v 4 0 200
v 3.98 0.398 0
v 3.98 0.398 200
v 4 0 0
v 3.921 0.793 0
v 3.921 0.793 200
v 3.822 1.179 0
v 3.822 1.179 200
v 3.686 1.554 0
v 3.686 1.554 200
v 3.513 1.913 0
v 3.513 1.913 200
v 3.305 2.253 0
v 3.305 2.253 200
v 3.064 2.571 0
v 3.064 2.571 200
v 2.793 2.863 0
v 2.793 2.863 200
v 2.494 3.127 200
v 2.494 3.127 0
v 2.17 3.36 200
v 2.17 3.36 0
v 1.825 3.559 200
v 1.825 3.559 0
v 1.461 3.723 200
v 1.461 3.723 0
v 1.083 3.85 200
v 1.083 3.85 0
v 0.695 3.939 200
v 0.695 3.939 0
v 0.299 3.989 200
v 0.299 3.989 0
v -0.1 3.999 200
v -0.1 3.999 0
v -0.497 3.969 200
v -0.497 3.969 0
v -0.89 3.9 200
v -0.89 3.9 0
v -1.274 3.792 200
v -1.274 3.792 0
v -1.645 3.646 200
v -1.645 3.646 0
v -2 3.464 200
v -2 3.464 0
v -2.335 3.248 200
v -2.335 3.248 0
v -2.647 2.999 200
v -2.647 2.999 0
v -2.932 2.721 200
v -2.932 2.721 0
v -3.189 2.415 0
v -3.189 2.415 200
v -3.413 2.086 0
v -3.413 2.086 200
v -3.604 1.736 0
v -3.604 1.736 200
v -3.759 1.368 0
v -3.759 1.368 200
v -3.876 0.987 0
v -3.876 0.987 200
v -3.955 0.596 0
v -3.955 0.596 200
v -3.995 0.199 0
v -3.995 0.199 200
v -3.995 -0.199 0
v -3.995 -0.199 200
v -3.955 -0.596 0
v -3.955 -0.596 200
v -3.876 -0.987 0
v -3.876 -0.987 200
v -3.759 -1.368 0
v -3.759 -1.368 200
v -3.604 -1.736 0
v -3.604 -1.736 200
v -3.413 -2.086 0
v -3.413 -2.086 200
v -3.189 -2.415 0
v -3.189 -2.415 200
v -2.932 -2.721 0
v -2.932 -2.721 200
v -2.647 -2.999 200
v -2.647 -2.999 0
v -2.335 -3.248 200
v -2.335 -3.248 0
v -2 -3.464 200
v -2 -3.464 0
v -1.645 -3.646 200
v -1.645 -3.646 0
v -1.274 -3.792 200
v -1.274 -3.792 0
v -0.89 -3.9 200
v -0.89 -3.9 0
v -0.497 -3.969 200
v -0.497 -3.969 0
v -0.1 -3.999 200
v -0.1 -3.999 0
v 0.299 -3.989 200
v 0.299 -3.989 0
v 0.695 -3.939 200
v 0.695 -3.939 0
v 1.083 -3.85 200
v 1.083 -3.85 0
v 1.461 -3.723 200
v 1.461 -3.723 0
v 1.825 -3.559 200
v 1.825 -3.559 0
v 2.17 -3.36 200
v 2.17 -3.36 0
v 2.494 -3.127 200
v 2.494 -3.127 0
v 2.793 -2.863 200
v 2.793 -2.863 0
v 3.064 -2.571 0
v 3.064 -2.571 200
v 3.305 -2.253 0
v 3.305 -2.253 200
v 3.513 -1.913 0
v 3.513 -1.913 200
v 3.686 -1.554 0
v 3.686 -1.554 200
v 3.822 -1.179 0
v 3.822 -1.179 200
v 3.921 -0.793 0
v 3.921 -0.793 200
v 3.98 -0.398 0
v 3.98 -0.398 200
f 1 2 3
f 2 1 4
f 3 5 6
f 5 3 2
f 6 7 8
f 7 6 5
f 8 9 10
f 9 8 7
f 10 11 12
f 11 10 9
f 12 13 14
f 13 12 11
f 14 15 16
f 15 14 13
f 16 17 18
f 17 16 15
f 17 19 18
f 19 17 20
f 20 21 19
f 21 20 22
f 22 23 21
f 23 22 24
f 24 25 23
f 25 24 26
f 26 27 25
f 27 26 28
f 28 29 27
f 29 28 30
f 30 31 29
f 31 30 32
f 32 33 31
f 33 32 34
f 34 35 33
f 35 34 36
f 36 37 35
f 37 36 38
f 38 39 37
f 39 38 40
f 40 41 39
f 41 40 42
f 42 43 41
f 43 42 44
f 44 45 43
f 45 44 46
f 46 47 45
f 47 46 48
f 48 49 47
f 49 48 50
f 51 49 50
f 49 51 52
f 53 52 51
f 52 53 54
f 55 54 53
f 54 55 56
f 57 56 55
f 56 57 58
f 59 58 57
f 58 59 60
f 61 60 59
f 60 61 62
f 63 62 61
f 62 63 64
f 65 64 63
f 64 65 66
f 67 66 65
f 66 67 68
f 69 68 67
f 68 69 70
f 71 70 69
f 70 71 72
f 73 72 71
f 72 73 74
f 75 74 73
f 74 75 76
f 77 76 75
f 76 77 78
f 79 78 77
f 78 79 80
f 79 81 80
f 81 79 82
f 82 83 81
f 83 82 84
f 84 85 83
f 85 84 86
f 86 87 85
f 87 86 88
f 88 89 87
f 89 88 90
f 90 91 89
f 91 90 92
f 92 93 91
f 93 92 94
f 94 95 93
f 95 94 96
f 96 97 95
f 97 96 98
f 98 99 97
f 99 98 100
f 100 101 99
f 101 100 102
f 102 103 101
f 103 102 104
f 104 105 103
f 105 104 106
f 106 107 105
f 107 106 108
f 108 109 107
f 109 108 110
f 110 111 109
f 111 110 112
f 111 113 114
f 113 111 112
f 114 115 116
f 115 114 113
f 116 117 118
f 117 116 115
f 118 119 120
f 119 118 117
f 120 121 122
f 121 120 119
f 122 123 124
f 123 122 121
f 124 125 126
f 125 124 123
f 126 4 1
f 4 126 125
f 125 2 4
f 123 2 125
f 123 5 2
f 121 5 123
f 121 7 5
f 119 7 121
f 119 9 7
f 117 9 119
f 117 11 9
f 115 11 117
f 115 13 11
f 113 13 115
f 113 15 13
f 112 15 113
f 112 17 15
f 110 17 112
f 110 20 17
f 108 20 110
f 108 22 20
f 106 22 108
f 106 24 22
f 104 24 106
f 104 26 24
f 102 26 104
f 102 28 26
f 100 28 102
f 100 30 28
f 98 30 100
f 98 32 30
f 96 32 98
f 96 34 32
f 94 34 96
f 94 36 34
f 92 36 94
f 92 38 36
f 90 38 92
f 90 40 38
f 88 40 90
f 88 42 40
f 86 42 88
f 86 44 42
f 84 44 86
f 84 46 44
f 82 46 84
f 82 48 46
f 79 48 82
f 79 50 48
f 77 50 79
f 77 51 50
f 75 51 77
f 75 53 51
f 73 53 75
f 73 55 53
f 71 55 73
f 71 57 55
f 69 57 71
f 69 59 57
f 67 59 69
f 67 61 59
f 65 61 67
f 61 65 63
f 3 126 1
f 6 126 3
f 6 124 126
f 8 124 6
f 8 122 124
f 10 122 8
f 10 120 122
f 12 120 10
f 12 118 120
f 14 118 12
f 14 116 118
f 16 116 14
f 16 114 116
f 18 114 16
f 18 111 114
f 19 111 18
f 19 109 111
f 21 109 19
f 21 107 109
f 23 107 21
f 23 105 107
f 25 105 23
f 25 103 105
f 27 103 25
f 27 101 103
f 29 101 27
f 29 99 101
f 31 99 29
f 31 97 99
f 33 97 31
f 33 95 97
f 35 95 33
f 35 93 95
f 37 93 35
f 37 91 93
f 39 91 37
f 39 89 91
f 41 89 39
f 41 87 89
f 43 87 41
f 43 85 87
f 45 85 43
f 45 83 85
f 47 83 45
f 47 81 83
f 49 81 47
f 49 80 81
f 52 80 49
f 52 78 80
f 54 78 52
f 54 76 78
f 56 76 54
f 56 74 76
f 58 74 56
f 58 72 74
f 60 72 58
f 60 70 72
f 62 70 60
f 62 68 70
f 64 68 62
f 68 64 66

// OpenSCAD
//pipe stem
//@mirontoli 2023-01-05
//https://www.thingiverse.com/thing:5769091/files
$fa=1;
$fs=0.4;
cylinder(h=200,r=4);
